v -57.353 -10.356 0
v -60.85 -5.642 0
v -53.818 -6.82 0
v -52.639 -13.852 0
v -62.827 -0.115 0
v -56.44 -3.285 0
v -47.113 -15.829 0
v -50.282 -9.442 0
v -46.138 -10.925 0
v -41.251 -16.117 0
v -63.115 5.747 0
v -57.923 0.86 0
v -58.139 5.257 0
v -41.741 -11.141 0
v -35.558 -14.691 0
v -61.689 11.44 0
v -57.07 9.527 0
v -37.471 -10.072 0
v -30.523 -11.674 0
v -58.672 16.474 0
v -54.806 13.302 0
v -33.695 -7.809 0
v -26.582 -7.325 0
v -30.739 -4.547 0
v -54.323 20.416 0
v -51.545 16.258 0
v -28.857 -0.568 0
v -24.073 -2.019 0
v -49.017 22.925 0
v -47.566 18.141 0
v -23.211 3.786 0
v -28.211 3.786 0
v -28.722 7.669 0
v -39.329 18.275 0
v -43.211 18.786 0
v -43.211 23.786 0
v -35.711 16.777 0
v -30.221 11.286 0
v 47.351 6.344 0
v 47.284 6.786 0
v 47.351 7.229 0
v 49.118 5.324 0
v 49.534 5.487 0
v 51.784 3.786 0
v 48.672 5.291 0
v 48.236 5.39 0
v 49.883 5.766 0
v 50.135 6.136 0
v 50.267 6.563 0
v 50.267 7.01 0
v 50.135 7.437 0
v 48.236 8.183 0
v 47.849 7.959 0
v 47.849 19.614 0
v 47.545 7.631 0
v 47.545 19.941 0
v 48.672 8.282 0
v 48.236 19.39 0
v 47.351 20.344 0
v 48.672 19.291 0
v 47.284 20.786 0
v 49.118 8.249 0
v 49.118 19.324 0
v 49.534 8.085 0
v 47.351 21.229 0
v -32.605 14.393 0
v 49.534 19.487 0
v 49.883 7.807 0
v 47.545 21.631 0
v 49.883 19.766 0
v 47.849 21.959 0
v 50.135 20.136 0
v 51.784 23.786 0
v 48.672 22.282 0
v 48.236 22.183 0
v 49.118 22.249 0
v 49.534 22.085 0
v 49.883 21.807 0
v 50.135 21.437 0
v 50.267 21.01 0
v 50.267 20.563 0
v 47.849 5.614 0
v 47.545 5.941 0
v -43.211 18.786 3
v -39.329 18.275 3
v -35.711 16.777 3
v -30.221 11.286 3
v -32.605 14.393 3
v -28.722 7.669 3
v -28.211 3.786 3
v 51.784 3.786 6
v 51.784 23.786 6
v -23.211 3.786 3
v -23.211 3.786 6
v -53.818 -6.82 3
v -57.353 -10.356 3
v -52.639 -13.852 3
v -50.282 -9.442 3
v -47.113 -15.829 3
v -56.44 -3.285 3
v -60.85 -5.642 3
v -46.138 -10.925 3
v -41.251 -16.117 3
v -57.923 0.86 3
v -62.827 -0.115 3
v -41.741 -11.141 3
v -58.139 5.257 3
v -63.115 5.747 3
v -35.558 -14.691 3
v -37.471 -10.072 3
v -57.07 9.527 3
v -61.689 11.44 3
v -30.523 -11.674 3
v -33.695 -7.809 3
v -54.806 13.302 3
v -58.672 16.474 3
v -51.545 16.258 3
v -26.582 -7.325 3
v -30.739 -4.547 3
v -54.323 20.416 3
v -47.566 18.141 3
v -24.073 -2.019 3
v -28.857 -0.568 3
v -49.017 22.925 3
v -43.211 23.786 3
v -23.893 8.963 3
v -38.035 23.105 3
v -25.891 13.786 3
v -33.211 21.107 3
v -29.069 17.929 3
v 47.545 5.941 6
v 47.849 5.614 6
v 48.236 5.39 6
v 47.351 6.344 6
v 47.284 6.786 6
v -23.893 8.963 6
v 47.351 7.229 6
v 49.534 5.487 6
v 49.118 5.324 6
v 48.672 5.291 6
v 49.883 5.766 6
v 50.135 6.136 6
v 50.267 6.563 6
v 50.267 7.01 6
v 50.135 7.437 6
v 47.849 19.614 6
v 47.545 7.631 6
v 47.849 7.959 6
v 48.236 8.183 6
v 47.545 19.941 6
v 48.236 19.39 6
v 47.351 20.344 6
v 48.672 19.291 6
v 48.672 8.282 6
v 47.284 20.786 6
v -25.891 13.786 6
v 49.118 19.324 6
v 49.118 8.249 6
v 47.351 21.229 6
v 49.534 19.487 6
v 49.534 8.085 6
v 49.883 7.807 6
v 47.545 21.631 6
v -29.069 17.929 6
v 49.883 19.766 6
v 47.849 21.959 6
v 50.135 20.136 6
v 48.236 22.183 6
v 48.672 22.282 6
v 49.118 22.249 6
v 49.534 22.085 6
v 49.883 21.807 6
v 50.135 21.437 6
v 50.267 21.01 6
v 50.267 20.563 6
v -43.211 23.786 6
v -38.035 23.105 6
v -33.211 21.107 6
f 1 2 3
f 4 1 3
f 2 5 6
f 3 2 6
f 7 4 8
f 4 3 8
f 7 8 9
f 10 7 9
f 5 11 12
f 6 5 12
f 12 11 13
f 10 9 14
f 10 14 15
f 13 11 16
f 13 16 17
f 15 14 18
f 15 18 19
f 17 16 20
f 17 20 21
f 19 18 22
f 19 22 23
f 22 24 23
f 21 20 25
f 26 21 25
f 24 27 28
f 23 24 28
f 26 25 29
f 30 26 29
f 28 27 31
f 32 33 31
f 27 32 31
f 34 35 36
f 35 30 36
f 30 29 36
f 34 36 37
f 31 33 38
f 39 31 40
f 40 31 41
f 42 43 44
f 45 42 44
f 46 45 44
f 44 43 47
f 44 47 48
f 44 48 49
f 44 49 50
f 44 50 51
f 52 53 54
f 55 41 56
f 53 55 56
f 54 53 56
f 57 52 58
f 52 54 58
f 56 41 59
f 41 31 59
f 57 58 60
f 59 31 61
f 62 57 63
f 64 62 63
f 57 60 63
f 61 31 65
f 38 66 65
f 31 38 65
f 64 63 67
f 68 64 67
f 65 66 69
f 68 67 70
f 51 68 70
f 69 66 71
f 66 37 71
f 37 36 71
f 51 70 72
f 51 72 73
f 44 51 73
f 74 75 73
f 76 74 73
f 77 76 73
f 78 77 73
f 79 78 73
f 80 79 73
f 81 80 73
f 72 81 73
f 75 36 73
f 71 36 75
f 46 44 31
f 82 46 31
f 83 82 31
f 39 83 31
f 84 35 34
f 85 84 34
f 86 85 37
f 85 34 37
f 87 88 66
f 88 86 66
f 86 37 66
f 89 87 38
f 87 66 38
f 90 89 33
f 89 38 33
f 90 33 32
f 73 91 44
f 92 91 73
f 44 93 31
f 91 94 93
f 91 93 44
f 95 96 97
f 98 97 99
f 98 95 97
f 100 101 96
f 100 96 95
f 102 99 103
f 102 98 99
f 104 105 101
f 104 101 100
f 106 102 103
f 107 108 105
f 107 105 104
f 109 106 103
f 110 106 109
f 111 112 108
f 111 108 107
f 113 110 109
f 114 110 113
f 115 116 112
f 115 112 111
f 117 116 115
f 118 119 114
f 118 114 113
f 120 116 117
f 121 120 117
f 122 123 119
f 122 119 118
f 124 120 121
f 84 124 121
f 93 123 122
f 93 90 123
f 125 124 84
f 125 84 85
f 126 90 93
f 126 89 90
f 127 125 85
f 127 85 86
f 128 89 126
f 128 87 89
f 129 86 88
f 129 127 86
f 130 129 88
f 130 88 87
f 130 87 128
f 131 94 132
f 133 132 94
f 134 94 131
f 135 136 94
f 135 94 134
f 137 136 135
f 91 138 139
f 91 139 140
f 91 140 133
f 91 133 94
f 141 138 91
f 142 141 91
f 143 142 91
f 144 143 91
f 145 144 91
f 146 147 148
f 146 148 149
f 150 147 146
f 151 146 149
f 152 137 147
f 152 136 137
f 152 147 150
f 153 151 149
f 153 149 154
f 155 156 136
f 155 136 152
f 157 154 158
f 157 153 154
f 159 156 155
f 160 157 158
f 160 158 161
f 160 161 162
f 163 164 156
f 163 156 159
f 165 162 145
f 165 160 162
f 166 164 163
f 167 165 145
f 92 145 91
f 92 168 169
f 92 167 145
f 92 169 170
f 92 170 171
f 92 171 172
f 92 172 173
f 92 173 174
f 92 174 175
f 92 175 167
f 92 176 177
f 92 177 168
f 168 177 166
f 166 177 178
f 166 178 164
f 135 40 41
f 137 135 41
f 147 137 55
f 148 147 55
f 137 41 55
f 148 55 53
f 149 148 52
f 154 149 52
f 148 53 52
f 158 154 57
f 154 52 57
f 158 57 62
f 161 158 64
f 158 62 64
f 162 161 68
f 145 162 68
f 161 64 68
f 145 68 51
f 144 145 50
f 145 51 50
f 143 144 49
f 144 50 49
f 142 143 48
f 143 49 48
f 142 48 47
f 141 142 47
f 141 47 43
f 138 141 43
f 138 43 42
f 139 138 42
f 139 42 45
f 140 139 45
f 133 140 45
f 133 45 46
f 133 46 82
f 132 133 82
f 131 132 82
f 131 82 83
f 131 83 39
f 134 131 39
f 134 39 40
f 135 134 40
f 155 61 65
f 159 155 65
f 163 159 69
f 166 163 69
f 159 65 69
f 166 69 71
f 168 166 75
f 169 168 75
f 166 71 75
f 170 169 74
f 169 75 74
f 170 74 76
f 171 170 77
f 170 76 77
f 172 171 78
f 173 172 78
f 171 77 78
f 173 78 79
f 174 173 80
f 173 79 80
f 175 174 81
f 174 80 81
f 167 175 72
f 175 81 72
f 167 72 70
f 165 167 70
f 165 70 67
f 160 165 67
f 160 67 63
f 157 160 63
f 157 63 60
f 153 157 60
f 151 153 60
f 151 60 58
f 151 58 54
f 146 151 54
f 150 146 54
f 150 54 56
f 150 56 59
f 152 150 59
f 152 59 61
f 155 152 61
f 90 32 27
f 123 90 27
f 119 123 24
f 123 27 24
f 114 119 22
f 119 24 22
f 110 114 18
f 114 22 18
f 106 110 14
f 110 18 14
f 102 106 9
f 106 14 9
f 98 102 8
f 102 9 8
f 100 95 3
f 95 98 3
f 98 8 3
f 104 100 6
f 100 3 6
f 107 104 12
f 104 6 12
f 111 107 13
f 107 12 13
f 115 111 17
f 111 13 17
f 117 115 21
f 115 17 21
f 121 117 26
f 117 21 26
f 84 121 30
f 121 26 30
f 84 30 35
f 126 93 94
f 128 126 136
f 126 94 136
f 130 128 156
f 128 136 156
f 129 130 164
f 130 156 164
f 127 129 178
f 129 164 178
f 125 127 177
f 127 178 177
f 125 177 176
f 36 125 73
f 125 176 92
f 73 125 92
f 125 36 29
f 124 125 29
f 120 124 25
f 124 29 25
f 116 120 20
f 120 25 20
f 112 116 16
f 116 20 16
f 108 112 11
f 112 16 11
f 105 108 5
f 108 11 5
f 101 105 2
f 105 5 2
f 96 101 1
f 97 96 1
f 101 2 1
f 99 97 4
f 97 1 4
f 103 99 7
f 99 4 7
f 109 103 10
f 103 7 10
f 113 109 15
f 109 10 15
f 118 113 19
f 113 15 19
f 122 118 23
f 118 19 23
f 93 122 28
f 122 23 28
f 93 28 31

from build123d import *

# Parameters (mm, degrees)
BOSS_EXTRU_1_DEPTH      = 6
ESQUISSE2_R             = 20
ESQUISSE2_R_2           = 15
ENL_V_MAT_EXTRU_1_DEPTH = 3
ESQUISSE3_W             = 9.17
ESQUISSE3_H             = 20
BOSS_EXTRU_2_DEPTH      = 6
ESQUISSE4_R             = 1.5
ENL_V_MAT_EXTRU_2_DEPTH = 10


with BuildPart() as part:
    # Esquisse1 → Boss.-Extru.1 (new body)
    with BuildSketch(Plane.XY):
        with BuildLine():
            Line((42.613906887, 3.786407767), (42.613906887, 23.786407767))
            Line((42.613906887, 23.786407767), (-43.211335831, 23.786407767))
            ThreePointArc((-43.211335831, 23.786407767), (-29.069200208, 17.928543391), (-23.211335831, 3.786407767))
            Line((-23.211335831, 3.786407767), (42.613906887, 3.786407767))
        make_face()
        with BuildLine():
            ThreePointArc((-23.211335831, 3.786407767), (-29.069200208, 17.928543391), (-43.211335831, 23.786407767))
            Line((-43.211335831, 23.786407767), (-43.211335831, 18.786407767))
            ThreePointArc((-43.211335831, 18.786407767), (-32.604734113, 14.393009485), (-28.211335831, 3.786407767))
            Line((-28.211335831, 3.786407767), (-23.211335831, 3.786407767))
        make_face()
        with BuildLine():
            Line((-43.211335831, 18.786407767), (-43.211335831, 23.786407767))
            ThreePointArc((-43.211335831, 23.786407767), (-57.353471455, -10.355727857), (-23.211335831, 3.786407767))
            Line((-23.211335831, 3.786407767), (-28.211335831, 3.786407767))
            ThreePointArc((-28.211335831, 3.786407767), (-53.817937549, -6.820193951), (-43.211335831, 18.786407767))
        make_face()
    extrude(amount=BOSS_EXTRU_1_DEPTH)

    # Esquisse2 → Enlèv. mat.-Extru.1 (cut)
    with BuildSketch(Plane.XY.offset(6)):
        with Locations((-43.211335831, 3.786407767)):
            Circle(ESQUISSE2_R)
        with Locations((-43.211335831, 3.786407767)):
            Circle(ESQUISSE2_R_2, mode=Mode.SUBTRACT)
    extrude(amount=-ENL_V_MAT_EXTRU_1_DEPTH, mode=Mode.SUBTRACT)

    # Esquisse3 → Boss.-Extru.2 (add)
    with BuildSketch(Plane.XY.offset(6)):
        with Locations((47.198906887, 13.786407767)):
            Rectangle(ESQUISSE3_W, ESQUISSE3_H)
    extrude(amount=-BOSS_EXTRU_2_DEPTH)

    # Esquisse4 → Enlèv. mat.-Extru.2 (cut)
    with BuildSketch(Plane(origin=(0, 0, 0), x_dir=(-1, 0, 0), z_dir=(0, 0, -1))):
        with Locations((-48.783906887, 20.786407767)):
            Circle(ESQUISSE4_R)
        with Locations((-48.783906887, 6.786407767)):
            Circle(ESQUISSE4_R)
    extrude(amount=-ENL_V_MAT_EXTRU_2_DEPTH, mode=Mode.SUBTRACT)


solid = part.part
